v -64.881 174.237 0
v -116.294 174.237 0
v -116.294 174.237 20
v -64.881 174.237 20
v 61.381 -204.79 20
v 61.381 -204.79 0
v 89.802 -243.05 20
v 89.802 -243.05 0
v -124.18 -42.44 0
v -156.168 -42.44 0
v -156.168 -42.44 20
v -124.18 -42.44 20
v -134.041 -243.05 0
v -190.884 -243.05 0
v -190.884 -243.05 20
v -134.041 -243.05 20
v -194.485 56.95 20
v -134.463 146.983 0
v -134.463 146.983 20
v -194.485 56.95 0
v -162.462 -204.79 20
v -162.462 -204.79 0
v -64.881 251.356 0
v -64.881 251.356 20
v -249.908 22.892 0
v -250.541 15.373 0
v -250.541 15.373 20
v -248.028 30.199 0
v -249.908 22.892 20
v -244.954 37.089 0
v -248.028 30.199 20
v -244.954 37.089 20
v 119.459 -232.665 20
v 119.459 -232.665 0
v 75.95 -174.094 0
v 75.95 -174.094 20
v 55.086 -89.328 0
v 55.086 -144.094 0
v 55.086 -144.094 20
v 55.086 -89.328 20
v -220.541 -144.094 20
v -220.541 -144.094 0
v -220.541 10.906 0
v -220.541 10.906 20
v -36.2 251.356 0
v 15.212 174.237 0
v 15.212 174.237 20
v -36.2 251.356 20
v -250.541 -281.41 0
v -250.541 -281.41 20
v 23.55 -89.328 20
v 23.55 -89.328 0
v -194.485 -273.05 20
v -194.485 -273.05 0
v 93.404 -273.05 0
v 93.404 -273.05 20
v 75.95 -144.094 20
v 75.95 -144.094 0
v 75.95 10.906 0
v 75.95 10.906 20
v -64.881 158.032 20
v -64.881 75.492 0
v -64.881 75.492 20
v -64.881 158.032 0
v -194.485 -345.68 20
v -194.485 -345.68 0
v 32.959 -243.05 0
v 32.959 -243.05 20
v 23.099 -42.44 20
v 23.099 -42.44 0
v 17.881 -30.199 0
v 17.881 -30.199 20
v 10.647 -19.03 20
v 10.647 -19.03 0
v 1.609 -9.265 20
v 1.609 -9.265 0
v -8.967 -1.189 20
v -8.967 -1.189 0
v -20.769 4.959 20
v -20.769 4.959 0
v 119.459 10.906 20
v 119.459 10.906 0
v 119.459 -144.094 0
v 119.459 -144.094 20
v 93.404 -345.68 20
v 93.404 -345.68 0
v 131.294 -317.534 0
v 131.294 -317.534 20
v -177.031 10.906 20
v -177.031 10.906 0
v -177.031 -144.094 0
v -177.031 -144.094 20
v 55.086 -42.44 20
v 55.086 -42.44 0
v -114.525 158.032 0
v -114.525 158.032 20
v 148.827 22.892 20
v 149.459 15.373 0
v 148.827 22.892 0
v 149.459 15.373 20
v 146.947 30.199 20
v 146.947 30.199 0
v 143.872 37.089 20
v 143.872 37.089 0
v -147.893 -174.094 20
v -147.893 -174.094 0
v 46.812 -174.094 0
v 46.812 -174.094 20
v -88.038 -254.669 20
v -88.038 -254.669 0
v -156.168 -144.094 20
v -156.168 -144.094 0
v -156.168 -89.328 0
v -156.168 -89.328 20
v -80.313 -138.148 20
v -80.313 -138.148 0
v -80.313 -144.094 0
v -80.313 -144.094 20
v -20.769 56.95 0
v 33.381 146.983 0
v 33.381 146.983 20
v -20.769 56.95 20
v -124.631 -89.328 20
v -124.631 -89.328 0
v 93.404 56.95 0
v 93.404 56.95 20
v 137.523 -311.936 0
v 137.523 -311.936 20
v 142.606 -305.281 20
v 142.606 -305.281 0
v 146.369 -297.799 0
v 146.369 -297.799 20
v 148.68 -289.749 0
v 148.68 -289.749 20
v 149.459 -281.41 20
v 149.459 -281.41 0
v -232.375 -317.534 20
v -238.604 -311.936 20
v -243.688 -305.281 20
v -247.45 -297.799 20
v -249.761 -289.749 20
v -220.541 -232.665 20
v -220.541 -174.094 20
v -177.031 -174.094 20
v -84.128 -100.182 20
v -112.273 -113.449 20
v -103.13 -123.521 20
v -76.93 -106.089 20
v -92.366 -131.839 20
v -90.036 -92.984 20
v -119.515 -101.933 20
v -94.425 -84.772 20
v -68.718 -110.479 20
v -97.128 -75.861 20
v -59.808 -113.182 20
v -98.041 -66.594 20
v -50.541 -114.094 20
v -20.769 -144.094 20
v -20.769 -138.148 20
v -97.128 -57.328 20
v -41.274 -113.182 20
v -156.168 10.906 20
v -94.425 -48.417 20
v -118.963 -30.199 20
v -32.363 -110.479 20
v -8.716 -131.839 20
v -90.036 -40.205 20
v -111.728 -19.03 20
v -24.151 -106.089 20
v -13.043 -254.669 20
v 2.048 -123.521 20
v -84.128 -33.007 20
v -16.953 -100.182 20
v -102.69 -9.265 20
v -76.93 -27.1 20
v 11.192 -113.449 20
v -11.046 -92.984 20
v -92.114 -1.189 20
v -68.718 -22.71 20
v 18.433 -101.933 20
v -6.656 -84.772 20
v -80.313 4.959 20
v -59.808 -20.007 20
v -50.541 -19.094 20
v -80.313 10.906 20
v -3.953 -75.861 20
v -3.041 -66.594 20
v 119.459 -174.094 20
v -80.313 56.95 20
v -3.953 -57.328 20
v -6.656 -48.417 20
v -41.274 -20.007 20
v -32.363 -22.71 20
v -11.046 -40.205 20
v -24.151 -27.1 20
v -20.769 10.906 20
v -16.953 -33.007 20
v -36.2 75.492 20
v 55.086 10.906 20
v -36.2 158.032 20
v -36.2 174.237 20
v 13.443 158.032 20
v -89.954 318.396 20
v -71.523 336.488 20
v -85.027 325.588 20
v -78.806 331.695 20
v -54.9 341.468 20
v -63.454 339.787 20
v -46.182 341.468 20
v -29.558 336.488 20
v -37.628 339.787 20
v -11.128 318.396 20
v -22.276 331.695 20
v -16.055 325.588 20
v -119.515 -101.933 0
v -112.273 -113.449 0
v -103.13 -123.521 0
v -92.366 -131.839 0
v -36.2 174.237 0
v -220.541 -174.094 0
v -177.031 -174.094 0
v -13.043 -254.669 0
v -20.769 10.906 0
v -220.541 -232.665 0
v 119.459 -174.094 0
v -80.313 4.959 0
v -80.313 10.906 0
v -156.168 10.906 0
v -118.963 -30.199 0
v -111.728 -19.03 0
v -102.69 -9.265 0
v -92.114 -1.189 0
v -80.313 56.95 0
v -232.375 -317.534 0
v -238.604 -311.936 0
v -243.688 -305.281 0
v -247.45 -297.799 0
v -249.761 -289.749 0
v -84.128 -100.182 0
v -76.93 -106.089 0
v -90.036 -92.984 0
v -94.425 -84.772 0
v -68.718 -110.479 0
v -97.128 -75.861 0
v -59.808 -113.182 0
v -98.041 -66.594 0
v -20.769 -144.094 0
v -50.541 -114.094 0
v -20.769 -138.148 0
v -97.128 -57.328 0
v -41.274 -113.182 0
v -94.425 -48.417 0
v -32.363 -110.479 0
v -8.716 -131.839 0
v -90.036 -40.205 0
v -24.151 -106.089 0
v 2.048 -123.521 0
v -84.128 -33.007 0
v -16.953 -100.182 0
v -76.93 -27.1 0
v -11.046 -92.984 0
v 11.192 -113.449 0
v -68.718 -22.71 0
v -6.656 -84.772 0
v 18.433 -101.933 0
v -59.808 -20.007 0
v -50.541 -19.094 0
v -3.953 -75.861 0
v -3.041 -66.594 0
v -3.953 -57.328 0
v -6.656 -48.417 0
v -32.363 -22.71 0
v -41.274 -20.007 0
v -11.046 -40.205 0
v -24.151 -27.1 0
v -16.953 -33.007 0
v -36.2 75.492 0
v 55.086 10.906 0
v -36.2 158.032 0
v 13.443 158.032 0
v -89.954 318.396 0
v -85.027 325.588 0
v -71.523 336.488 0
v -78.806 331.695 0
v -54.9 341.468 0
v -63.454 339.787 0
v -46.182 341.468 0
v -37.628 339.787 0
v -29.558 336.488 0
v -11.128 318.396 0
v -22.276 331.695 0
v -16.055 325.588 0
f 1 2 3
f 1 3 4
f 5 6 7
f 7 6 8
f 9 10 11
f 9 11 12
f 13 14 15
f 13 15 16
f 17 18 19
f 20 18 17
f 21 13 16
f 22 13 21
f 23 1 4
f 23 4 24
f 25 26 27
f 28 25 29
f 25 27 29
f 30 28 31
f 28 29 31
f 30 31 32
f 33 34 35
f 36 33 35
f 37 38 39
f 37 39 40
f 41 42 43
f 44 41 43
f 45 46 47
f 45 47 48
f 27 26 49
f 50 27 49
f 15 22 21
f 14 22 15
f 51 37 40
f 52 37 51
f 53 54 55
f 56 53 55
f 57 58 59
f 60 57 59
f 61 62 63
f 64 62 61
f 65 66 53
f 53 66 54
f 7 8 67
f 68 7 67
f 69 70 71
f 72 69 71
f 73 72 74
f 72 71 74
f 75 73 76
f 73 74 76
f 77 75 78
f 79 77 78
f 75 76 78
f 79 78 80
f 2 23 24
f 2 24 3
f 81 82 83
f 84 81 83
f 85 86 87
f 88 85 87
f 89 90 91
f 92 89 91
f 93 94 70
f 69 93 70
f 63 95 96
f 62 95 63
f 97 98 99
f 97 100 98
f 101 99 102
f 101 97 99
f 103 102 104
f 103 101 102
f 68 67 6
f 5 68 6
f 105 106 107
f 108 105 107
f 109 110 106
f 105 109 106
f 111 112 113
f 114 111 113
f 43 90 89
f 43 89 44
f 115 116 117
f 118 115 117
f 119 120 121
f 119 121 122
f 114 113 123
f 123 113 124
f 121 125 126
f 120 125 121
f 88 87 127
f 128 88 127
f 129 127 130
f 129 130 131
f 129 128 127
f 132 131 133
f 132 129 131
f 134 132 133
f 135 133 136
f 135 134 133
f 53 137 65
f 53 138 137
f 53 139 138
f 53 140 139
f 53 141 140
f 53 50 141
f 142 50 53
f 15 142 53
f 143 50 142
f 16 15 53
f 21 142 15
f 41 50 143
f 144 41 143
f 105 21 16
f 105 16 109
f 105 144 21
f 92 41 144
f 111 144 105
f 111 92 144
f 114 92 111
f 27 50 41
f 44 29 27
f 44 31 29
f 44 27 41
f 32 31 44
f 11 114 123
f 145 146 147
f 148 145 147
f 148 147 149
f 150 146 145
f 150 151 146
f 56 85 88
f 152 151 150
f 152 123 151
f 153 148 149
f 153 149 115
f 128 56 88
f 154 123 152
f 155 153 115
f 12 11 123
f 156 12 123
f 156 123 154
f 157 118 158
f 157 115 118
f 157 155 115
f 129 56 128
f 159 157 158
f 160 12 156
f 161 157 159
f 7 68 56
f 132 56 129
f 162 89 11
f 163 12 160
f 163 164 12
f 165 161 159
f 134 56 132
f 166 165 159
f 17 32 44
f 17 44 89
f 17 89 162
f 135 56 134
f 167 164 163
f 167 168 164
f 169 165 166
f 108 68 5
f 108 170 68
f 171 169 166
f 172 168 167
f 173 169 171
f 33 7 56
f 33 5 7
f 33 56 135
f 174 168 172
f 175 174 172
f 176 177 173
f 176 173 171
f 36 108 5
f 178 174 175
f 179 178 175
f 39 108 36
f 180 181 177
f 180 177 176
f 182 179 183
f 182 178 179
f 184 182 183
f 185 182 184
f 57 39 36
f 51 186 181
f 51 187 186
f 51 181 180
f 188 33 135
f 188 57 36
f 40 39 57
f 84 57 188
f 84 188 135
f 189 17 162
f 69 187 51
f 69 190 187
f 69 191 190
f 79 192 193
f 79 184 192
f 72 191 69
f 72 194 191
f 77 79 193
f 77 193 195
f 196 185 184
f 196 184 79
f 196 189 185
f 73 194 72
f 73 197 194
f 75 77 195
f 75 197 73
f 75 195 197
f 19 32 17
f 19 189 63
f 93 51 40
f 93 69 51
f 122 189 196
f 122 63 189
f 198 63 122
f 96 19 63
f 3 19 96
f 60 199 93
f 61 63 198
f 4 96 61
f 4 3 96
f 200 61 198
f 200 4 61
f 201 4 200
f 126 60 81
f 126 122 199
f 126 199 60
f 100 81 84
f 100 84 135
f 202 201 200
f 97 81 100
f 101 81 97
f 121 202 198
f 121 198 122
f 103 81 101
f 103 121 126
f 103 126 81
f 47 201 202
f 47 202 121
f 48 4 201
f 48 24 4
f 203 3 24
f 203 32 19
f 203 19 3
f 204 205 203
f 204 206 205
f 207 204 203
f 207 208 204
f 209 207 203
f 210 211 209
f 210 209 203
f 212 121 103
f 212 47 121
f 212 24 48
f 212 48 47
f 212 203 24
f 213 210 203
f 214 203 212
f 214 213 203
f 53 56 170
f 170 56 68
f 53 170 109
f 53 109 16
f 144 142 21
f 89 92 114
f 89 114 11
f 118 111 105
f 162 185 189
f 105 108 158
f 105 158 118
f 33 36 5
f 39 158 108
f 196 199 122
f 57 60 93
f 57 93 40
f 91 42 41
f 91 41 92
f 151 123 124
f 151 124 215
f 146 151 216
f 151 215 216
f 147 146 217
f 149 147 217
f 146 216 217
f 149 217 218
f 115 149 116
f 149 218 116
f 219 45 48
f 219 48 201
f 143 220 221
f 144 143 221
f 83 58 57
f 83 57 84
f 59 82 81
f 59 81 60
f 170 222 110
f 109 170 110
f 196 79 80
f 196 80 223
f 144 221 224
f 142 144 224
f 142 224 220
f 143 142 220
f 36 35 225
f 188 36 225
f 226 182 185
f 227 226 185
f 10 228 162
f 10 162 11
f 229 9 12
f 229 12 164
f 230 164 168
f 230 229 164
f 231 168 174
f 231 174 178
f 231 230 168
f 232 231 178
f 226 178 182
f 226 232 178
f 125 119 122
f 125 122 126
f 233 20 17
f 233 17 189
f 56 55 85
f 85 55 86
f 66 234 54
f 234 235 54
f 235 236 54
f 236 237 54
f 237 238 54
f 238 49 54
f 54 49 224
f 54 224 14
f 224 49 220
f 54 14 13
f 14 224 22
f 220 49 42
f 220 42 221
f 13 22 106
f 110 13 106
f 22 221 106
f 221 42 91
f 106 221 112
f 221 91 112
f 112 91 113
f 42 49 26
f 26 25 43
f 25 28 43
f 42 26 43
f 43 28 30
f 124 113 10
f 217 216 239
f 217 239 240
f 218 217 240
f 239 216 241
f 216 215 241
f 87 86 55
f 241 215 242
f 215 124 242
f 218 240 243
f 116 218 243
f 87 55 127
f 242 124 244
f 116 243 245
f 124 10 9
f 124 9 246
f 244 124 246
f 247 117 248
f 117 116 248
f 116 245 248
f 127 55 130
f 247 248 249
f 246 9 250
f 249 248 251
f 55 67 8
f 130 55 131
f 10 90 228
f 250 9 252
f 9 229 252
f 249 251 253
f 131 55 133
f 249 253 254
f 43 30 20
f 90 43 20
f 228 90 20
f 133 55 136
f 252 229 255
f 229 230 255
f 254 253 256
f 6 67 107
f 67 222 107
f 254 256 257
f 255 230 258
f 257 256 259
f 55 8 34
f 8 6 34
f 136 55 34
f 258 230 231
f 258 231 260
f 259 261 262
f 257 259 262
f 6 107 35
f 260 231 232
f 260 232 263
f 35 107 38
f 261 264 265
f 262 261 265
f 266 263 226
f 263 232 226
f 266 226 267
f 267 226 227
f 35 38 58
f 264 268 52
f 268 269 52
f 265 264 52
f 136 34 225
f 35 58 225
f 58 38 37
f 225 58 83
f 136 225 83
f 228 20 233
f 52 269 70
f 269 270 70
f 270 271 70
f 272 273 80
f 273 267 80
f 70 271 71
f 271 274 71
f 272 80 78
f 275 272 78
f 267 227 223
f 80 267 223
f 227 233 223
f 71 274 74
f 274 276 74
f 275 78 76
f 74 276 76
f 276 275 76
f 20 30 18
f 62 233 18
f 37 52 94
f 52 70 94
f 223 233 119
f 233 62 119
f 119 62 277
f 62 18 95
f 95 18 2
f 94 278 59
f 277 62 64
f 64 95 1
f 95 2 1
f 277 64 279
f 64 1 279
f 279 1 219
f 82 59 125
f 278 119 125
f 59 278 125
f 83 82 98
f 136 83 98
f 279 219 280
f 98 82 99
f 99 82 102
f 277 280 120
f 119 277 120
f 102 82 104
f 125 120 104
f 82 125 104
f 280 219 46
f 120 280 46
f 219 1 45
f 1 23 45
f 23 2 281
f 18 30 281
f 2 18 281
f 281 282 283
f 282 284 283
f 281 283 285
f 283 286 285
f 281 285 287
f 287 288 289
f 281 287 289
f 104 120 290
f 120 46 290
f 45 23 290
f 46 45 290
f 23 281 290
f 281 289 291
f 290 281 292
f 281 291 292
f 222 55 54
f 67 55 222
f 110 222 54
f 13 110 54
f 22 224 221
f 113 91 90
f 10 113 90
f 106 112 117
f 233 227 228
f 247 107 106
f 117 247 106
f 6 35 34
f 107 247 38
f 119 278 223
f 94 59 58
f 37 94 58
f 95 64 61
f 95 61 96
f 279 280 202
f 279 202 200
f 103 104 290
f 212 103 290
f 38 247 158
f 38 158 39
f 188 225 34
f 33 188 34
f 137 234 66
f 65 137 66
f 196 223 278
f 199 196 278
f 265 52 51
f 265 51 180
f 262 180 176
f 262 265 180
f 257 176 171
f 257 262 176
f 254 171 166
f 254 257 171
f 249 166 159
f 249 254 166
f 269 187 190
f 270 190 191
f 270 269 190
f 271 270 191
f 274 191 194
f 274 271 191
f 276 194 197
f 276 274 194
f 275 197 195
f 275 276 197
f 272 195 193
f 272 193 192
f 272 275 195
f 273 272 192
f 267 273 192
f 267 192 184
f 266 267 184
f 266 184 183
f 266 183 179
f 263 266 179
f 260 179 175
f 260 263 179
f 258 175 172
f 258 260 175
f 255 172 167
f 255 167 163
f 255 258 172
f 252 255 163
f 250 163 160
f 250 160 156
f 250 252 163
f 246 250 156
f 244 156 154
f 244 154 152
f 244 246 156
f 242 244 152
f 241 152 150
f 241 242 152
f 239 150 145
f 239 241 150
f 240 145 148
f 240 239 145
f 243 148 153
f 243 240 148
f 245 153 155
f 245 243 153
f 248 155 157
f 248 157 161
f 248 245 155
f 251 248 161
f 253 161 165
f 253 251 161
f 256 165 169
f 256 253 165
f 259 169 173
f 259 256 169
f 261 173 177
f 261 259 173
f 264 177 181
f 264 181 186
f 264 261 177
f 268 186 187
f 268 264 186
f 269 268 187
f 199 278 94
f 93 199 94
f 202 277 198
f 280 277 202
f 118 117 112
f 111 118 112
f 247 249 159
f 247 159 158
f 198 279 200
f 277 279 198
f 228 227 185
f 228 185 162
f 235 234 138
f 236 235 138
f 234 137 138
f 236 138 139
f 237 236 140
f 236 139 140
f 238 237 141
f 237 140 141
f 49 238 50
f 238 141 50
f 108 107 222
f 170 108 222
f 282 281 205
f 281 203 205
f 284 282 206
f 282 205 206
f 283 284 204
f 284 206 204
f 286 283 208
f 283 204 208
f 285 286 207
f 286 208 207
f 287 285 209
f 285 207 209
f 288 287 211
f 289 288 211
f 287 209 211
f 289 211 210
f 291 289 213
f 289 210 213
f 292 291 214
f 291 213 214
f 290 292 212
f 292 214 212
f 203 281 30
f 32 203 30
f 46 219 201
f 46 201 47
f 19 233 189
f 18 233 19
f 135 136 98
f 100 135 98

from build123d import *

# Parameters (mm, degrees)
SKETCH1_R           = 47.5
BOSS_EXTRUDE1_DEPTH = 20
FILLET1_R           = 45


with BuildPart() as part:
    # Sketch1 → Boss-Extrude1 (new body)
    with BuildSketch(Plane.XY):
        Polygon((-194.485228659, -273.050238686), (93.403745832, -273.050238686), (93.403745832, -345.680466299), (149.459258586, -304.039615326), (149.459258586, -273.050238686), (149.459258586, 26.949761314), (-50.540741414, 389.92600238), (-250.540741414, 26.949761314), (-250.540741414, -273.050238686), (-250.540741414, -304.039615326), (-194.485228659, -345.680466299), align=None)
        with Locations((-50.540741414, -66.594312027)):
            Circle(SKETCH1_R, mode=Mode.SUBTRACT)
        Polygon((-220.540741414, -174.094312027), (-177.031307775, -174.094312027), (-220.540741414, -232.665247906), align=None, mode=Mode.SUBTRACT)
        Polygon((-88.038179167, -254.669001578), (-147.89310645, -174.094312027), (46.811623623, -174.094312027), (-13.043303661, -254.669001578), align=None, mode=Mode.SUBTRACT)
        Polygon((89.802053233, -243.050238686), (32.959395338, -243.050238686), (61.380724285, -204.790401769), align=None, mode=Mode.SUBTRACT)
        Polygon((-220.540741414, -144.094312027), (-177.031307775, -144.094312027), (-177.031307775, -94.25920837), (-177.031307775, -51.592409031), (-177.031307775, 10.905687973), (-220.540741414, 10.905687973), (-220.540741414, -51.592409031), (-220.540741414, -94.25920837), align=None, mode=Mode.SUBTRACT)
        Polygon((-64.881138394, 251.355896711), (-116.293954083, 174.236673178), (-64.881138394, 174.236673178), align=None, mode=Mode.SUBTRACT)
        Polygon((93.403745832, 56.949761314), (33.381498462, 146.983132367), (-20.768536019, 56.949761314), align=None, mode=Mode.SUBTRACT)
        Polygon((-194.485228659, 56.949761314), (-80.312946809, 56.949761314), (-134.46298129, 146.983132367), align=None, mode=Mode.SUBTRACT)
        Polygon((119.459258586, -232.665247906), (75.949824948, -174.094312027), (119.459258586, -174.094312027), align=None, mode=Mode.SUBTRACT)
        Polygon((119.459258586, -144.094312027), (119.459258586, -94.25920837), (119.459258586, -51.592409031), (119.459258586, 10.905687973), (75.949824948, 10.905687973), (75.949824948, -51.592409031), (75.949824948, -94.25920837), (75.949824948, -144.094312027), align=None, mode=Mode.SUBTRACT)
        Polygon((-190.883536061, -243.050238686), (-134.040878165, -243.050238686), (-162.462207113, -204.790401769), align=None, mode=Mode.SUBTRACT)
        with BuildLine():
            Line((-156.167658148, 10.905687973), (-156.167658148, -42.439597831))
            Line((-156.167658148, -42.439597831), (-124.18040316, -42.439597831))
            ThreePointArc((-124.18040316, -42.439597831), (-107.419195748, -13.953154816), (-80.312946809, 4.958925397))
            Line((-80.312946809, 4.958925397), (-80.312946809, 10.905687973))
            Line((-80.312946809, 10.905687973), (-156.167658148, 10.905687973))
        make_face(mode=Mode.SUBTRACT)
        with BuildLine():
            Line((-156.167658148, -144.094312027), (-156.167658148, -89.328160682))
            Line((-156.167658148, -89.328160682), (-124.631375946, -89.328160682))
            ThreePointArc((-124.631375946, -89.328160682), (-107.922842799, -118.686004653), (-80.312946809, -138.147549452))
            Line((-80.312946809, -138.147549452), (-80.312946809, -144.094312027))
            Line((-80.312946809, -144.094312027), (-156.167658148, -144.094312027))
        make_face(mode=Mode.SUBTRACT)
        with BuildLine():
            Line((-20.768536019, -138.147549452), (-20.768536019, -144.094312027))
            Line((-20.768536019, -144.094312027), (55.08617532, -144.094312027))
            Line((55.08617532, -144.094312027), (55.08617532, -89.328160682))
            Line((55.08617532, -89.328160682), (23.549893118, -89.328160682))
            ThreePointArc((23.549893118, -89.328160682), (6.841359971, -118.686004653), (-20.768536019, -138.147549452))
        make_face(mode=Mode.SUBTRACT)
        with BuildLine():
            Line((-20.768536019, 4.958925397), (-20.768536019, 10.905687973))
            Line((-20.768536019, 10.905687973), (55.08617532, 10.905687973))
            Line((55.08617532, 10.905687973), (55.08617532, -42.439597831))
            Line((55.08617532, -42.439597831), (23.098920333, -42.439597831))
            ThreePointArc((23.098920333, -42.439597831), (6.337712921, -13.953154816), (-20.768536019, 4.958925397))
        make_face(mode=Mode.SUBTRACT)
        Polygon((13.443150149, 158.032314781), (-36.200344433, 158.032314781), (-36.200344433, 75.49181022), align=None, mode=Mode.SUBTRACT)
        Polygon((15.212471256, 174.236673178), (-36.200344433, 251.355896711), (-36.200344433, 174.236673178), align=None, mode=Mode.SUBTRACT)
        Polygon((-114.524632976, 158.032314781), (-64.881138394, 75.49181022), (-64.881138394, 158.032314781), align=None, mode=Mode.SUBTRACT)
    extrude(amount=BOSS_EXTRUDE1_DEPTH)

    # Fillet1
    fillet1_edges = [part.edges().sort_by_distance(p)[0] for p in [
        (149.459258586, -304.039615326, 10),
        (-250.540741414, -304.039615326, 10),
        (-250.540741414, 26.949761314, 10),
        (-50.540741414, 389.92600238, 10),
        (149.459258586, 26.949761314, 10),
    ]]
    fillet(fillet1_edges, radius=FILLET1_R)


solid = part.part
